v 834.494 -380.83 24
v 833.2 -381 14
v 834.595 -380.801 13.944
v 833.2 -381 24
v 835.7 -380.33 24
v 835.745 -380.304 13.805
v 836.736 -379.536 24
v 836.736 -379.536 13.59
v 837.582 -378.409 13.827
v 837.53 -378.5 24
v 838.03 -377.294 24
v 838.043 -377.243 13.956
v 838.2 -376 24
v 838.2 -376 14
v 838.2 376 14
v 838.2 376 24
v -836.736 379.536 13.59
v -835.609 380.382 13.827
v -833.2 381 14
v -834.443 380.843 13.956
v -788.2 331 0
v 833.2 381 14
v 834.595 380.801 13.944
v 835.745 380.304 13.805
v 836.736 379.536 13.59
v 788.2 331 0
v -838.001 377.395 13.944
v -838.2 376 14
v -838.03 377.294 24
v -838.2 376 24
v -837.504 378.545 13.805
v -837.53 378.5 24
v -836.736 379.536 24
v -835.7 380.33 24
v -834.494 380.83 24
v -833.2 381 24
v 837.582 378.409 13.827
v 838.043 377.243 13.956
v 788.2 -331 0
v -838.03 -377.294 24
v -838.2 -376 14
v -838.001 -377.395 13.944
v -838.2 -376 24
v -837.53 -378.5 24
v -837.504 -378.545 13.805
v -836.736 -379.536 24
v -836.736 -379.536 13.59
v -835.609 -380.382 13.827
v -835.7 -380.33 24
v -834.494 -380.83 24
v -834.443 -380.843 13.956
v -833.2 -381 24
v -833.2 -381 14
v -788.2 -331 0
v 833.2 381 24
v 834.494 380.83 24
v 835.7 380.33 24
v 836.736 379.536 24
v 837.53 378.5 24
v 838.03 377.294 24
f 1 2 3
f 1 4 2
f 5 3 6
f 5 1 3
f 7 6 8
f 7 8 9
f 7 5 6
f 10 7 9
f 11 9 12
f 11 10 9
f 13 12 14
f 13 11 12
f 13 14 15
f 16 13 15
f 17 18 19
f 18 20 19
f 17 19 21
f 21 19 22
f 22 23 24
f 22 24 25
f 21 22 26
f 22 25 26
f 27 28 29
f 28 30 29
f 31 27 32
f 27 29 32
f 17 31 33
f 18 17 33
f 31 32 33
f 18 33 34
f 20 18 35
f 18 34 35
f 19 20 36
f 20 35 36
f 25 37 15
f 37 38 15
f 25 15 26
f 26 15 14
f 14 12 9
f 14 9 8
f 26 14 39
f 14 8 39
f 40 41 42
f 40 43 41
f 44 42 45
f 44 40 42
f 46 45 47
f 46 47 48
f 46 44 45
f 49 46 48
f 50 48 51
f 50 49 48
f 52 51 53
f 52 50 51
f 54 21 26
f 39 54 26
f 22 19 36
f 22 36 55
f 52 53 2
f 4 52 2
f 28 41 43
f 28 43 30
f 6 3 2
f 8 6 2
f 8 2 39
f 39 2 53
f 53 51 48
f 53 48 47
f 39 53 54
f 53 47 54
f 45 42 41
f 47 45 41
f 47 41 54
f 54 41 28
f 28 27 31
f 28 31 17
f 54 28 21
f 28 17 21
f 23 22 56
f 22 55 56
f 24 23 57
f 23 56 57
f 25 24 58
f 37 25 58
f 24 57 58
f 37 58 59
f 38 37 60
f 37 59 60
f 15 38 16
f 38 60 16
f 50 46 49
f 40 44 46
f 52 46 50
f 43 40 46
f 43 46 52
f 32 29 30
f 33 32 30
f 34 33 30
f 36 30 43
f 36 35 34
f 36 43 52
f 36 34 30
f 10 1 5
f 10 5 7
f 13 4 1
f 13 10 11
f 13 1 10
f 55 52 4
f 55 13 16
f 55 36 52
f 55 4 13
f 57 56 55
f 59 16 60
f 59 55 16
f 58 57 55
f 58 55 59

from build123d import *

# Parameters (mm, degrees)
F0_W     = 1676.4
F0_H     = 762
F1_DEPTH = 24
F5_R     = 5


with BuildPart() as f1:
    # F0 (on Top) → F1 (new body)
    with BuildSketch(Plane.XY):
        Rectangle(F0_W, F0_H)
    extrude(amount=F1_DEPTH)

    # F4: sweep along a path in F3
    with BuildLine(Plane(origin=(0, 0, 0), x_dir=(1, 0, 0), z_dir=(0, 0, -1))) as f4_path:
        Line((838.2, 381), (-838.2, 381))
        Line((-838.2, 381), (-838.2, -381))
        Line((-838.2, -381), (838.2, -381))
        Line((838.2, -381), (838.2, 381))
    # F2 (on face) → F4 (sweep, cut)
    with BuildSketch(Plane.YZ.offset(838.2)):
        Polygon((381, 14), (331, 0), (381, 0), align=None)
    sweep(path=f4_path.line, transition=Transition.RIGHT, mode=Mode.SUBTRACT)

    # F5
    f5_edges = [f1.edges().sort_by_distance(p)[0] for p in [
        (838.2, 381, 19),
        (838.2, -381, 19),
        (-838.2, 381, 19),
        (-838.2, -381, 19),
    ]]
    fillet(f5_edges, radius=F5_R)


solid = f1.part
